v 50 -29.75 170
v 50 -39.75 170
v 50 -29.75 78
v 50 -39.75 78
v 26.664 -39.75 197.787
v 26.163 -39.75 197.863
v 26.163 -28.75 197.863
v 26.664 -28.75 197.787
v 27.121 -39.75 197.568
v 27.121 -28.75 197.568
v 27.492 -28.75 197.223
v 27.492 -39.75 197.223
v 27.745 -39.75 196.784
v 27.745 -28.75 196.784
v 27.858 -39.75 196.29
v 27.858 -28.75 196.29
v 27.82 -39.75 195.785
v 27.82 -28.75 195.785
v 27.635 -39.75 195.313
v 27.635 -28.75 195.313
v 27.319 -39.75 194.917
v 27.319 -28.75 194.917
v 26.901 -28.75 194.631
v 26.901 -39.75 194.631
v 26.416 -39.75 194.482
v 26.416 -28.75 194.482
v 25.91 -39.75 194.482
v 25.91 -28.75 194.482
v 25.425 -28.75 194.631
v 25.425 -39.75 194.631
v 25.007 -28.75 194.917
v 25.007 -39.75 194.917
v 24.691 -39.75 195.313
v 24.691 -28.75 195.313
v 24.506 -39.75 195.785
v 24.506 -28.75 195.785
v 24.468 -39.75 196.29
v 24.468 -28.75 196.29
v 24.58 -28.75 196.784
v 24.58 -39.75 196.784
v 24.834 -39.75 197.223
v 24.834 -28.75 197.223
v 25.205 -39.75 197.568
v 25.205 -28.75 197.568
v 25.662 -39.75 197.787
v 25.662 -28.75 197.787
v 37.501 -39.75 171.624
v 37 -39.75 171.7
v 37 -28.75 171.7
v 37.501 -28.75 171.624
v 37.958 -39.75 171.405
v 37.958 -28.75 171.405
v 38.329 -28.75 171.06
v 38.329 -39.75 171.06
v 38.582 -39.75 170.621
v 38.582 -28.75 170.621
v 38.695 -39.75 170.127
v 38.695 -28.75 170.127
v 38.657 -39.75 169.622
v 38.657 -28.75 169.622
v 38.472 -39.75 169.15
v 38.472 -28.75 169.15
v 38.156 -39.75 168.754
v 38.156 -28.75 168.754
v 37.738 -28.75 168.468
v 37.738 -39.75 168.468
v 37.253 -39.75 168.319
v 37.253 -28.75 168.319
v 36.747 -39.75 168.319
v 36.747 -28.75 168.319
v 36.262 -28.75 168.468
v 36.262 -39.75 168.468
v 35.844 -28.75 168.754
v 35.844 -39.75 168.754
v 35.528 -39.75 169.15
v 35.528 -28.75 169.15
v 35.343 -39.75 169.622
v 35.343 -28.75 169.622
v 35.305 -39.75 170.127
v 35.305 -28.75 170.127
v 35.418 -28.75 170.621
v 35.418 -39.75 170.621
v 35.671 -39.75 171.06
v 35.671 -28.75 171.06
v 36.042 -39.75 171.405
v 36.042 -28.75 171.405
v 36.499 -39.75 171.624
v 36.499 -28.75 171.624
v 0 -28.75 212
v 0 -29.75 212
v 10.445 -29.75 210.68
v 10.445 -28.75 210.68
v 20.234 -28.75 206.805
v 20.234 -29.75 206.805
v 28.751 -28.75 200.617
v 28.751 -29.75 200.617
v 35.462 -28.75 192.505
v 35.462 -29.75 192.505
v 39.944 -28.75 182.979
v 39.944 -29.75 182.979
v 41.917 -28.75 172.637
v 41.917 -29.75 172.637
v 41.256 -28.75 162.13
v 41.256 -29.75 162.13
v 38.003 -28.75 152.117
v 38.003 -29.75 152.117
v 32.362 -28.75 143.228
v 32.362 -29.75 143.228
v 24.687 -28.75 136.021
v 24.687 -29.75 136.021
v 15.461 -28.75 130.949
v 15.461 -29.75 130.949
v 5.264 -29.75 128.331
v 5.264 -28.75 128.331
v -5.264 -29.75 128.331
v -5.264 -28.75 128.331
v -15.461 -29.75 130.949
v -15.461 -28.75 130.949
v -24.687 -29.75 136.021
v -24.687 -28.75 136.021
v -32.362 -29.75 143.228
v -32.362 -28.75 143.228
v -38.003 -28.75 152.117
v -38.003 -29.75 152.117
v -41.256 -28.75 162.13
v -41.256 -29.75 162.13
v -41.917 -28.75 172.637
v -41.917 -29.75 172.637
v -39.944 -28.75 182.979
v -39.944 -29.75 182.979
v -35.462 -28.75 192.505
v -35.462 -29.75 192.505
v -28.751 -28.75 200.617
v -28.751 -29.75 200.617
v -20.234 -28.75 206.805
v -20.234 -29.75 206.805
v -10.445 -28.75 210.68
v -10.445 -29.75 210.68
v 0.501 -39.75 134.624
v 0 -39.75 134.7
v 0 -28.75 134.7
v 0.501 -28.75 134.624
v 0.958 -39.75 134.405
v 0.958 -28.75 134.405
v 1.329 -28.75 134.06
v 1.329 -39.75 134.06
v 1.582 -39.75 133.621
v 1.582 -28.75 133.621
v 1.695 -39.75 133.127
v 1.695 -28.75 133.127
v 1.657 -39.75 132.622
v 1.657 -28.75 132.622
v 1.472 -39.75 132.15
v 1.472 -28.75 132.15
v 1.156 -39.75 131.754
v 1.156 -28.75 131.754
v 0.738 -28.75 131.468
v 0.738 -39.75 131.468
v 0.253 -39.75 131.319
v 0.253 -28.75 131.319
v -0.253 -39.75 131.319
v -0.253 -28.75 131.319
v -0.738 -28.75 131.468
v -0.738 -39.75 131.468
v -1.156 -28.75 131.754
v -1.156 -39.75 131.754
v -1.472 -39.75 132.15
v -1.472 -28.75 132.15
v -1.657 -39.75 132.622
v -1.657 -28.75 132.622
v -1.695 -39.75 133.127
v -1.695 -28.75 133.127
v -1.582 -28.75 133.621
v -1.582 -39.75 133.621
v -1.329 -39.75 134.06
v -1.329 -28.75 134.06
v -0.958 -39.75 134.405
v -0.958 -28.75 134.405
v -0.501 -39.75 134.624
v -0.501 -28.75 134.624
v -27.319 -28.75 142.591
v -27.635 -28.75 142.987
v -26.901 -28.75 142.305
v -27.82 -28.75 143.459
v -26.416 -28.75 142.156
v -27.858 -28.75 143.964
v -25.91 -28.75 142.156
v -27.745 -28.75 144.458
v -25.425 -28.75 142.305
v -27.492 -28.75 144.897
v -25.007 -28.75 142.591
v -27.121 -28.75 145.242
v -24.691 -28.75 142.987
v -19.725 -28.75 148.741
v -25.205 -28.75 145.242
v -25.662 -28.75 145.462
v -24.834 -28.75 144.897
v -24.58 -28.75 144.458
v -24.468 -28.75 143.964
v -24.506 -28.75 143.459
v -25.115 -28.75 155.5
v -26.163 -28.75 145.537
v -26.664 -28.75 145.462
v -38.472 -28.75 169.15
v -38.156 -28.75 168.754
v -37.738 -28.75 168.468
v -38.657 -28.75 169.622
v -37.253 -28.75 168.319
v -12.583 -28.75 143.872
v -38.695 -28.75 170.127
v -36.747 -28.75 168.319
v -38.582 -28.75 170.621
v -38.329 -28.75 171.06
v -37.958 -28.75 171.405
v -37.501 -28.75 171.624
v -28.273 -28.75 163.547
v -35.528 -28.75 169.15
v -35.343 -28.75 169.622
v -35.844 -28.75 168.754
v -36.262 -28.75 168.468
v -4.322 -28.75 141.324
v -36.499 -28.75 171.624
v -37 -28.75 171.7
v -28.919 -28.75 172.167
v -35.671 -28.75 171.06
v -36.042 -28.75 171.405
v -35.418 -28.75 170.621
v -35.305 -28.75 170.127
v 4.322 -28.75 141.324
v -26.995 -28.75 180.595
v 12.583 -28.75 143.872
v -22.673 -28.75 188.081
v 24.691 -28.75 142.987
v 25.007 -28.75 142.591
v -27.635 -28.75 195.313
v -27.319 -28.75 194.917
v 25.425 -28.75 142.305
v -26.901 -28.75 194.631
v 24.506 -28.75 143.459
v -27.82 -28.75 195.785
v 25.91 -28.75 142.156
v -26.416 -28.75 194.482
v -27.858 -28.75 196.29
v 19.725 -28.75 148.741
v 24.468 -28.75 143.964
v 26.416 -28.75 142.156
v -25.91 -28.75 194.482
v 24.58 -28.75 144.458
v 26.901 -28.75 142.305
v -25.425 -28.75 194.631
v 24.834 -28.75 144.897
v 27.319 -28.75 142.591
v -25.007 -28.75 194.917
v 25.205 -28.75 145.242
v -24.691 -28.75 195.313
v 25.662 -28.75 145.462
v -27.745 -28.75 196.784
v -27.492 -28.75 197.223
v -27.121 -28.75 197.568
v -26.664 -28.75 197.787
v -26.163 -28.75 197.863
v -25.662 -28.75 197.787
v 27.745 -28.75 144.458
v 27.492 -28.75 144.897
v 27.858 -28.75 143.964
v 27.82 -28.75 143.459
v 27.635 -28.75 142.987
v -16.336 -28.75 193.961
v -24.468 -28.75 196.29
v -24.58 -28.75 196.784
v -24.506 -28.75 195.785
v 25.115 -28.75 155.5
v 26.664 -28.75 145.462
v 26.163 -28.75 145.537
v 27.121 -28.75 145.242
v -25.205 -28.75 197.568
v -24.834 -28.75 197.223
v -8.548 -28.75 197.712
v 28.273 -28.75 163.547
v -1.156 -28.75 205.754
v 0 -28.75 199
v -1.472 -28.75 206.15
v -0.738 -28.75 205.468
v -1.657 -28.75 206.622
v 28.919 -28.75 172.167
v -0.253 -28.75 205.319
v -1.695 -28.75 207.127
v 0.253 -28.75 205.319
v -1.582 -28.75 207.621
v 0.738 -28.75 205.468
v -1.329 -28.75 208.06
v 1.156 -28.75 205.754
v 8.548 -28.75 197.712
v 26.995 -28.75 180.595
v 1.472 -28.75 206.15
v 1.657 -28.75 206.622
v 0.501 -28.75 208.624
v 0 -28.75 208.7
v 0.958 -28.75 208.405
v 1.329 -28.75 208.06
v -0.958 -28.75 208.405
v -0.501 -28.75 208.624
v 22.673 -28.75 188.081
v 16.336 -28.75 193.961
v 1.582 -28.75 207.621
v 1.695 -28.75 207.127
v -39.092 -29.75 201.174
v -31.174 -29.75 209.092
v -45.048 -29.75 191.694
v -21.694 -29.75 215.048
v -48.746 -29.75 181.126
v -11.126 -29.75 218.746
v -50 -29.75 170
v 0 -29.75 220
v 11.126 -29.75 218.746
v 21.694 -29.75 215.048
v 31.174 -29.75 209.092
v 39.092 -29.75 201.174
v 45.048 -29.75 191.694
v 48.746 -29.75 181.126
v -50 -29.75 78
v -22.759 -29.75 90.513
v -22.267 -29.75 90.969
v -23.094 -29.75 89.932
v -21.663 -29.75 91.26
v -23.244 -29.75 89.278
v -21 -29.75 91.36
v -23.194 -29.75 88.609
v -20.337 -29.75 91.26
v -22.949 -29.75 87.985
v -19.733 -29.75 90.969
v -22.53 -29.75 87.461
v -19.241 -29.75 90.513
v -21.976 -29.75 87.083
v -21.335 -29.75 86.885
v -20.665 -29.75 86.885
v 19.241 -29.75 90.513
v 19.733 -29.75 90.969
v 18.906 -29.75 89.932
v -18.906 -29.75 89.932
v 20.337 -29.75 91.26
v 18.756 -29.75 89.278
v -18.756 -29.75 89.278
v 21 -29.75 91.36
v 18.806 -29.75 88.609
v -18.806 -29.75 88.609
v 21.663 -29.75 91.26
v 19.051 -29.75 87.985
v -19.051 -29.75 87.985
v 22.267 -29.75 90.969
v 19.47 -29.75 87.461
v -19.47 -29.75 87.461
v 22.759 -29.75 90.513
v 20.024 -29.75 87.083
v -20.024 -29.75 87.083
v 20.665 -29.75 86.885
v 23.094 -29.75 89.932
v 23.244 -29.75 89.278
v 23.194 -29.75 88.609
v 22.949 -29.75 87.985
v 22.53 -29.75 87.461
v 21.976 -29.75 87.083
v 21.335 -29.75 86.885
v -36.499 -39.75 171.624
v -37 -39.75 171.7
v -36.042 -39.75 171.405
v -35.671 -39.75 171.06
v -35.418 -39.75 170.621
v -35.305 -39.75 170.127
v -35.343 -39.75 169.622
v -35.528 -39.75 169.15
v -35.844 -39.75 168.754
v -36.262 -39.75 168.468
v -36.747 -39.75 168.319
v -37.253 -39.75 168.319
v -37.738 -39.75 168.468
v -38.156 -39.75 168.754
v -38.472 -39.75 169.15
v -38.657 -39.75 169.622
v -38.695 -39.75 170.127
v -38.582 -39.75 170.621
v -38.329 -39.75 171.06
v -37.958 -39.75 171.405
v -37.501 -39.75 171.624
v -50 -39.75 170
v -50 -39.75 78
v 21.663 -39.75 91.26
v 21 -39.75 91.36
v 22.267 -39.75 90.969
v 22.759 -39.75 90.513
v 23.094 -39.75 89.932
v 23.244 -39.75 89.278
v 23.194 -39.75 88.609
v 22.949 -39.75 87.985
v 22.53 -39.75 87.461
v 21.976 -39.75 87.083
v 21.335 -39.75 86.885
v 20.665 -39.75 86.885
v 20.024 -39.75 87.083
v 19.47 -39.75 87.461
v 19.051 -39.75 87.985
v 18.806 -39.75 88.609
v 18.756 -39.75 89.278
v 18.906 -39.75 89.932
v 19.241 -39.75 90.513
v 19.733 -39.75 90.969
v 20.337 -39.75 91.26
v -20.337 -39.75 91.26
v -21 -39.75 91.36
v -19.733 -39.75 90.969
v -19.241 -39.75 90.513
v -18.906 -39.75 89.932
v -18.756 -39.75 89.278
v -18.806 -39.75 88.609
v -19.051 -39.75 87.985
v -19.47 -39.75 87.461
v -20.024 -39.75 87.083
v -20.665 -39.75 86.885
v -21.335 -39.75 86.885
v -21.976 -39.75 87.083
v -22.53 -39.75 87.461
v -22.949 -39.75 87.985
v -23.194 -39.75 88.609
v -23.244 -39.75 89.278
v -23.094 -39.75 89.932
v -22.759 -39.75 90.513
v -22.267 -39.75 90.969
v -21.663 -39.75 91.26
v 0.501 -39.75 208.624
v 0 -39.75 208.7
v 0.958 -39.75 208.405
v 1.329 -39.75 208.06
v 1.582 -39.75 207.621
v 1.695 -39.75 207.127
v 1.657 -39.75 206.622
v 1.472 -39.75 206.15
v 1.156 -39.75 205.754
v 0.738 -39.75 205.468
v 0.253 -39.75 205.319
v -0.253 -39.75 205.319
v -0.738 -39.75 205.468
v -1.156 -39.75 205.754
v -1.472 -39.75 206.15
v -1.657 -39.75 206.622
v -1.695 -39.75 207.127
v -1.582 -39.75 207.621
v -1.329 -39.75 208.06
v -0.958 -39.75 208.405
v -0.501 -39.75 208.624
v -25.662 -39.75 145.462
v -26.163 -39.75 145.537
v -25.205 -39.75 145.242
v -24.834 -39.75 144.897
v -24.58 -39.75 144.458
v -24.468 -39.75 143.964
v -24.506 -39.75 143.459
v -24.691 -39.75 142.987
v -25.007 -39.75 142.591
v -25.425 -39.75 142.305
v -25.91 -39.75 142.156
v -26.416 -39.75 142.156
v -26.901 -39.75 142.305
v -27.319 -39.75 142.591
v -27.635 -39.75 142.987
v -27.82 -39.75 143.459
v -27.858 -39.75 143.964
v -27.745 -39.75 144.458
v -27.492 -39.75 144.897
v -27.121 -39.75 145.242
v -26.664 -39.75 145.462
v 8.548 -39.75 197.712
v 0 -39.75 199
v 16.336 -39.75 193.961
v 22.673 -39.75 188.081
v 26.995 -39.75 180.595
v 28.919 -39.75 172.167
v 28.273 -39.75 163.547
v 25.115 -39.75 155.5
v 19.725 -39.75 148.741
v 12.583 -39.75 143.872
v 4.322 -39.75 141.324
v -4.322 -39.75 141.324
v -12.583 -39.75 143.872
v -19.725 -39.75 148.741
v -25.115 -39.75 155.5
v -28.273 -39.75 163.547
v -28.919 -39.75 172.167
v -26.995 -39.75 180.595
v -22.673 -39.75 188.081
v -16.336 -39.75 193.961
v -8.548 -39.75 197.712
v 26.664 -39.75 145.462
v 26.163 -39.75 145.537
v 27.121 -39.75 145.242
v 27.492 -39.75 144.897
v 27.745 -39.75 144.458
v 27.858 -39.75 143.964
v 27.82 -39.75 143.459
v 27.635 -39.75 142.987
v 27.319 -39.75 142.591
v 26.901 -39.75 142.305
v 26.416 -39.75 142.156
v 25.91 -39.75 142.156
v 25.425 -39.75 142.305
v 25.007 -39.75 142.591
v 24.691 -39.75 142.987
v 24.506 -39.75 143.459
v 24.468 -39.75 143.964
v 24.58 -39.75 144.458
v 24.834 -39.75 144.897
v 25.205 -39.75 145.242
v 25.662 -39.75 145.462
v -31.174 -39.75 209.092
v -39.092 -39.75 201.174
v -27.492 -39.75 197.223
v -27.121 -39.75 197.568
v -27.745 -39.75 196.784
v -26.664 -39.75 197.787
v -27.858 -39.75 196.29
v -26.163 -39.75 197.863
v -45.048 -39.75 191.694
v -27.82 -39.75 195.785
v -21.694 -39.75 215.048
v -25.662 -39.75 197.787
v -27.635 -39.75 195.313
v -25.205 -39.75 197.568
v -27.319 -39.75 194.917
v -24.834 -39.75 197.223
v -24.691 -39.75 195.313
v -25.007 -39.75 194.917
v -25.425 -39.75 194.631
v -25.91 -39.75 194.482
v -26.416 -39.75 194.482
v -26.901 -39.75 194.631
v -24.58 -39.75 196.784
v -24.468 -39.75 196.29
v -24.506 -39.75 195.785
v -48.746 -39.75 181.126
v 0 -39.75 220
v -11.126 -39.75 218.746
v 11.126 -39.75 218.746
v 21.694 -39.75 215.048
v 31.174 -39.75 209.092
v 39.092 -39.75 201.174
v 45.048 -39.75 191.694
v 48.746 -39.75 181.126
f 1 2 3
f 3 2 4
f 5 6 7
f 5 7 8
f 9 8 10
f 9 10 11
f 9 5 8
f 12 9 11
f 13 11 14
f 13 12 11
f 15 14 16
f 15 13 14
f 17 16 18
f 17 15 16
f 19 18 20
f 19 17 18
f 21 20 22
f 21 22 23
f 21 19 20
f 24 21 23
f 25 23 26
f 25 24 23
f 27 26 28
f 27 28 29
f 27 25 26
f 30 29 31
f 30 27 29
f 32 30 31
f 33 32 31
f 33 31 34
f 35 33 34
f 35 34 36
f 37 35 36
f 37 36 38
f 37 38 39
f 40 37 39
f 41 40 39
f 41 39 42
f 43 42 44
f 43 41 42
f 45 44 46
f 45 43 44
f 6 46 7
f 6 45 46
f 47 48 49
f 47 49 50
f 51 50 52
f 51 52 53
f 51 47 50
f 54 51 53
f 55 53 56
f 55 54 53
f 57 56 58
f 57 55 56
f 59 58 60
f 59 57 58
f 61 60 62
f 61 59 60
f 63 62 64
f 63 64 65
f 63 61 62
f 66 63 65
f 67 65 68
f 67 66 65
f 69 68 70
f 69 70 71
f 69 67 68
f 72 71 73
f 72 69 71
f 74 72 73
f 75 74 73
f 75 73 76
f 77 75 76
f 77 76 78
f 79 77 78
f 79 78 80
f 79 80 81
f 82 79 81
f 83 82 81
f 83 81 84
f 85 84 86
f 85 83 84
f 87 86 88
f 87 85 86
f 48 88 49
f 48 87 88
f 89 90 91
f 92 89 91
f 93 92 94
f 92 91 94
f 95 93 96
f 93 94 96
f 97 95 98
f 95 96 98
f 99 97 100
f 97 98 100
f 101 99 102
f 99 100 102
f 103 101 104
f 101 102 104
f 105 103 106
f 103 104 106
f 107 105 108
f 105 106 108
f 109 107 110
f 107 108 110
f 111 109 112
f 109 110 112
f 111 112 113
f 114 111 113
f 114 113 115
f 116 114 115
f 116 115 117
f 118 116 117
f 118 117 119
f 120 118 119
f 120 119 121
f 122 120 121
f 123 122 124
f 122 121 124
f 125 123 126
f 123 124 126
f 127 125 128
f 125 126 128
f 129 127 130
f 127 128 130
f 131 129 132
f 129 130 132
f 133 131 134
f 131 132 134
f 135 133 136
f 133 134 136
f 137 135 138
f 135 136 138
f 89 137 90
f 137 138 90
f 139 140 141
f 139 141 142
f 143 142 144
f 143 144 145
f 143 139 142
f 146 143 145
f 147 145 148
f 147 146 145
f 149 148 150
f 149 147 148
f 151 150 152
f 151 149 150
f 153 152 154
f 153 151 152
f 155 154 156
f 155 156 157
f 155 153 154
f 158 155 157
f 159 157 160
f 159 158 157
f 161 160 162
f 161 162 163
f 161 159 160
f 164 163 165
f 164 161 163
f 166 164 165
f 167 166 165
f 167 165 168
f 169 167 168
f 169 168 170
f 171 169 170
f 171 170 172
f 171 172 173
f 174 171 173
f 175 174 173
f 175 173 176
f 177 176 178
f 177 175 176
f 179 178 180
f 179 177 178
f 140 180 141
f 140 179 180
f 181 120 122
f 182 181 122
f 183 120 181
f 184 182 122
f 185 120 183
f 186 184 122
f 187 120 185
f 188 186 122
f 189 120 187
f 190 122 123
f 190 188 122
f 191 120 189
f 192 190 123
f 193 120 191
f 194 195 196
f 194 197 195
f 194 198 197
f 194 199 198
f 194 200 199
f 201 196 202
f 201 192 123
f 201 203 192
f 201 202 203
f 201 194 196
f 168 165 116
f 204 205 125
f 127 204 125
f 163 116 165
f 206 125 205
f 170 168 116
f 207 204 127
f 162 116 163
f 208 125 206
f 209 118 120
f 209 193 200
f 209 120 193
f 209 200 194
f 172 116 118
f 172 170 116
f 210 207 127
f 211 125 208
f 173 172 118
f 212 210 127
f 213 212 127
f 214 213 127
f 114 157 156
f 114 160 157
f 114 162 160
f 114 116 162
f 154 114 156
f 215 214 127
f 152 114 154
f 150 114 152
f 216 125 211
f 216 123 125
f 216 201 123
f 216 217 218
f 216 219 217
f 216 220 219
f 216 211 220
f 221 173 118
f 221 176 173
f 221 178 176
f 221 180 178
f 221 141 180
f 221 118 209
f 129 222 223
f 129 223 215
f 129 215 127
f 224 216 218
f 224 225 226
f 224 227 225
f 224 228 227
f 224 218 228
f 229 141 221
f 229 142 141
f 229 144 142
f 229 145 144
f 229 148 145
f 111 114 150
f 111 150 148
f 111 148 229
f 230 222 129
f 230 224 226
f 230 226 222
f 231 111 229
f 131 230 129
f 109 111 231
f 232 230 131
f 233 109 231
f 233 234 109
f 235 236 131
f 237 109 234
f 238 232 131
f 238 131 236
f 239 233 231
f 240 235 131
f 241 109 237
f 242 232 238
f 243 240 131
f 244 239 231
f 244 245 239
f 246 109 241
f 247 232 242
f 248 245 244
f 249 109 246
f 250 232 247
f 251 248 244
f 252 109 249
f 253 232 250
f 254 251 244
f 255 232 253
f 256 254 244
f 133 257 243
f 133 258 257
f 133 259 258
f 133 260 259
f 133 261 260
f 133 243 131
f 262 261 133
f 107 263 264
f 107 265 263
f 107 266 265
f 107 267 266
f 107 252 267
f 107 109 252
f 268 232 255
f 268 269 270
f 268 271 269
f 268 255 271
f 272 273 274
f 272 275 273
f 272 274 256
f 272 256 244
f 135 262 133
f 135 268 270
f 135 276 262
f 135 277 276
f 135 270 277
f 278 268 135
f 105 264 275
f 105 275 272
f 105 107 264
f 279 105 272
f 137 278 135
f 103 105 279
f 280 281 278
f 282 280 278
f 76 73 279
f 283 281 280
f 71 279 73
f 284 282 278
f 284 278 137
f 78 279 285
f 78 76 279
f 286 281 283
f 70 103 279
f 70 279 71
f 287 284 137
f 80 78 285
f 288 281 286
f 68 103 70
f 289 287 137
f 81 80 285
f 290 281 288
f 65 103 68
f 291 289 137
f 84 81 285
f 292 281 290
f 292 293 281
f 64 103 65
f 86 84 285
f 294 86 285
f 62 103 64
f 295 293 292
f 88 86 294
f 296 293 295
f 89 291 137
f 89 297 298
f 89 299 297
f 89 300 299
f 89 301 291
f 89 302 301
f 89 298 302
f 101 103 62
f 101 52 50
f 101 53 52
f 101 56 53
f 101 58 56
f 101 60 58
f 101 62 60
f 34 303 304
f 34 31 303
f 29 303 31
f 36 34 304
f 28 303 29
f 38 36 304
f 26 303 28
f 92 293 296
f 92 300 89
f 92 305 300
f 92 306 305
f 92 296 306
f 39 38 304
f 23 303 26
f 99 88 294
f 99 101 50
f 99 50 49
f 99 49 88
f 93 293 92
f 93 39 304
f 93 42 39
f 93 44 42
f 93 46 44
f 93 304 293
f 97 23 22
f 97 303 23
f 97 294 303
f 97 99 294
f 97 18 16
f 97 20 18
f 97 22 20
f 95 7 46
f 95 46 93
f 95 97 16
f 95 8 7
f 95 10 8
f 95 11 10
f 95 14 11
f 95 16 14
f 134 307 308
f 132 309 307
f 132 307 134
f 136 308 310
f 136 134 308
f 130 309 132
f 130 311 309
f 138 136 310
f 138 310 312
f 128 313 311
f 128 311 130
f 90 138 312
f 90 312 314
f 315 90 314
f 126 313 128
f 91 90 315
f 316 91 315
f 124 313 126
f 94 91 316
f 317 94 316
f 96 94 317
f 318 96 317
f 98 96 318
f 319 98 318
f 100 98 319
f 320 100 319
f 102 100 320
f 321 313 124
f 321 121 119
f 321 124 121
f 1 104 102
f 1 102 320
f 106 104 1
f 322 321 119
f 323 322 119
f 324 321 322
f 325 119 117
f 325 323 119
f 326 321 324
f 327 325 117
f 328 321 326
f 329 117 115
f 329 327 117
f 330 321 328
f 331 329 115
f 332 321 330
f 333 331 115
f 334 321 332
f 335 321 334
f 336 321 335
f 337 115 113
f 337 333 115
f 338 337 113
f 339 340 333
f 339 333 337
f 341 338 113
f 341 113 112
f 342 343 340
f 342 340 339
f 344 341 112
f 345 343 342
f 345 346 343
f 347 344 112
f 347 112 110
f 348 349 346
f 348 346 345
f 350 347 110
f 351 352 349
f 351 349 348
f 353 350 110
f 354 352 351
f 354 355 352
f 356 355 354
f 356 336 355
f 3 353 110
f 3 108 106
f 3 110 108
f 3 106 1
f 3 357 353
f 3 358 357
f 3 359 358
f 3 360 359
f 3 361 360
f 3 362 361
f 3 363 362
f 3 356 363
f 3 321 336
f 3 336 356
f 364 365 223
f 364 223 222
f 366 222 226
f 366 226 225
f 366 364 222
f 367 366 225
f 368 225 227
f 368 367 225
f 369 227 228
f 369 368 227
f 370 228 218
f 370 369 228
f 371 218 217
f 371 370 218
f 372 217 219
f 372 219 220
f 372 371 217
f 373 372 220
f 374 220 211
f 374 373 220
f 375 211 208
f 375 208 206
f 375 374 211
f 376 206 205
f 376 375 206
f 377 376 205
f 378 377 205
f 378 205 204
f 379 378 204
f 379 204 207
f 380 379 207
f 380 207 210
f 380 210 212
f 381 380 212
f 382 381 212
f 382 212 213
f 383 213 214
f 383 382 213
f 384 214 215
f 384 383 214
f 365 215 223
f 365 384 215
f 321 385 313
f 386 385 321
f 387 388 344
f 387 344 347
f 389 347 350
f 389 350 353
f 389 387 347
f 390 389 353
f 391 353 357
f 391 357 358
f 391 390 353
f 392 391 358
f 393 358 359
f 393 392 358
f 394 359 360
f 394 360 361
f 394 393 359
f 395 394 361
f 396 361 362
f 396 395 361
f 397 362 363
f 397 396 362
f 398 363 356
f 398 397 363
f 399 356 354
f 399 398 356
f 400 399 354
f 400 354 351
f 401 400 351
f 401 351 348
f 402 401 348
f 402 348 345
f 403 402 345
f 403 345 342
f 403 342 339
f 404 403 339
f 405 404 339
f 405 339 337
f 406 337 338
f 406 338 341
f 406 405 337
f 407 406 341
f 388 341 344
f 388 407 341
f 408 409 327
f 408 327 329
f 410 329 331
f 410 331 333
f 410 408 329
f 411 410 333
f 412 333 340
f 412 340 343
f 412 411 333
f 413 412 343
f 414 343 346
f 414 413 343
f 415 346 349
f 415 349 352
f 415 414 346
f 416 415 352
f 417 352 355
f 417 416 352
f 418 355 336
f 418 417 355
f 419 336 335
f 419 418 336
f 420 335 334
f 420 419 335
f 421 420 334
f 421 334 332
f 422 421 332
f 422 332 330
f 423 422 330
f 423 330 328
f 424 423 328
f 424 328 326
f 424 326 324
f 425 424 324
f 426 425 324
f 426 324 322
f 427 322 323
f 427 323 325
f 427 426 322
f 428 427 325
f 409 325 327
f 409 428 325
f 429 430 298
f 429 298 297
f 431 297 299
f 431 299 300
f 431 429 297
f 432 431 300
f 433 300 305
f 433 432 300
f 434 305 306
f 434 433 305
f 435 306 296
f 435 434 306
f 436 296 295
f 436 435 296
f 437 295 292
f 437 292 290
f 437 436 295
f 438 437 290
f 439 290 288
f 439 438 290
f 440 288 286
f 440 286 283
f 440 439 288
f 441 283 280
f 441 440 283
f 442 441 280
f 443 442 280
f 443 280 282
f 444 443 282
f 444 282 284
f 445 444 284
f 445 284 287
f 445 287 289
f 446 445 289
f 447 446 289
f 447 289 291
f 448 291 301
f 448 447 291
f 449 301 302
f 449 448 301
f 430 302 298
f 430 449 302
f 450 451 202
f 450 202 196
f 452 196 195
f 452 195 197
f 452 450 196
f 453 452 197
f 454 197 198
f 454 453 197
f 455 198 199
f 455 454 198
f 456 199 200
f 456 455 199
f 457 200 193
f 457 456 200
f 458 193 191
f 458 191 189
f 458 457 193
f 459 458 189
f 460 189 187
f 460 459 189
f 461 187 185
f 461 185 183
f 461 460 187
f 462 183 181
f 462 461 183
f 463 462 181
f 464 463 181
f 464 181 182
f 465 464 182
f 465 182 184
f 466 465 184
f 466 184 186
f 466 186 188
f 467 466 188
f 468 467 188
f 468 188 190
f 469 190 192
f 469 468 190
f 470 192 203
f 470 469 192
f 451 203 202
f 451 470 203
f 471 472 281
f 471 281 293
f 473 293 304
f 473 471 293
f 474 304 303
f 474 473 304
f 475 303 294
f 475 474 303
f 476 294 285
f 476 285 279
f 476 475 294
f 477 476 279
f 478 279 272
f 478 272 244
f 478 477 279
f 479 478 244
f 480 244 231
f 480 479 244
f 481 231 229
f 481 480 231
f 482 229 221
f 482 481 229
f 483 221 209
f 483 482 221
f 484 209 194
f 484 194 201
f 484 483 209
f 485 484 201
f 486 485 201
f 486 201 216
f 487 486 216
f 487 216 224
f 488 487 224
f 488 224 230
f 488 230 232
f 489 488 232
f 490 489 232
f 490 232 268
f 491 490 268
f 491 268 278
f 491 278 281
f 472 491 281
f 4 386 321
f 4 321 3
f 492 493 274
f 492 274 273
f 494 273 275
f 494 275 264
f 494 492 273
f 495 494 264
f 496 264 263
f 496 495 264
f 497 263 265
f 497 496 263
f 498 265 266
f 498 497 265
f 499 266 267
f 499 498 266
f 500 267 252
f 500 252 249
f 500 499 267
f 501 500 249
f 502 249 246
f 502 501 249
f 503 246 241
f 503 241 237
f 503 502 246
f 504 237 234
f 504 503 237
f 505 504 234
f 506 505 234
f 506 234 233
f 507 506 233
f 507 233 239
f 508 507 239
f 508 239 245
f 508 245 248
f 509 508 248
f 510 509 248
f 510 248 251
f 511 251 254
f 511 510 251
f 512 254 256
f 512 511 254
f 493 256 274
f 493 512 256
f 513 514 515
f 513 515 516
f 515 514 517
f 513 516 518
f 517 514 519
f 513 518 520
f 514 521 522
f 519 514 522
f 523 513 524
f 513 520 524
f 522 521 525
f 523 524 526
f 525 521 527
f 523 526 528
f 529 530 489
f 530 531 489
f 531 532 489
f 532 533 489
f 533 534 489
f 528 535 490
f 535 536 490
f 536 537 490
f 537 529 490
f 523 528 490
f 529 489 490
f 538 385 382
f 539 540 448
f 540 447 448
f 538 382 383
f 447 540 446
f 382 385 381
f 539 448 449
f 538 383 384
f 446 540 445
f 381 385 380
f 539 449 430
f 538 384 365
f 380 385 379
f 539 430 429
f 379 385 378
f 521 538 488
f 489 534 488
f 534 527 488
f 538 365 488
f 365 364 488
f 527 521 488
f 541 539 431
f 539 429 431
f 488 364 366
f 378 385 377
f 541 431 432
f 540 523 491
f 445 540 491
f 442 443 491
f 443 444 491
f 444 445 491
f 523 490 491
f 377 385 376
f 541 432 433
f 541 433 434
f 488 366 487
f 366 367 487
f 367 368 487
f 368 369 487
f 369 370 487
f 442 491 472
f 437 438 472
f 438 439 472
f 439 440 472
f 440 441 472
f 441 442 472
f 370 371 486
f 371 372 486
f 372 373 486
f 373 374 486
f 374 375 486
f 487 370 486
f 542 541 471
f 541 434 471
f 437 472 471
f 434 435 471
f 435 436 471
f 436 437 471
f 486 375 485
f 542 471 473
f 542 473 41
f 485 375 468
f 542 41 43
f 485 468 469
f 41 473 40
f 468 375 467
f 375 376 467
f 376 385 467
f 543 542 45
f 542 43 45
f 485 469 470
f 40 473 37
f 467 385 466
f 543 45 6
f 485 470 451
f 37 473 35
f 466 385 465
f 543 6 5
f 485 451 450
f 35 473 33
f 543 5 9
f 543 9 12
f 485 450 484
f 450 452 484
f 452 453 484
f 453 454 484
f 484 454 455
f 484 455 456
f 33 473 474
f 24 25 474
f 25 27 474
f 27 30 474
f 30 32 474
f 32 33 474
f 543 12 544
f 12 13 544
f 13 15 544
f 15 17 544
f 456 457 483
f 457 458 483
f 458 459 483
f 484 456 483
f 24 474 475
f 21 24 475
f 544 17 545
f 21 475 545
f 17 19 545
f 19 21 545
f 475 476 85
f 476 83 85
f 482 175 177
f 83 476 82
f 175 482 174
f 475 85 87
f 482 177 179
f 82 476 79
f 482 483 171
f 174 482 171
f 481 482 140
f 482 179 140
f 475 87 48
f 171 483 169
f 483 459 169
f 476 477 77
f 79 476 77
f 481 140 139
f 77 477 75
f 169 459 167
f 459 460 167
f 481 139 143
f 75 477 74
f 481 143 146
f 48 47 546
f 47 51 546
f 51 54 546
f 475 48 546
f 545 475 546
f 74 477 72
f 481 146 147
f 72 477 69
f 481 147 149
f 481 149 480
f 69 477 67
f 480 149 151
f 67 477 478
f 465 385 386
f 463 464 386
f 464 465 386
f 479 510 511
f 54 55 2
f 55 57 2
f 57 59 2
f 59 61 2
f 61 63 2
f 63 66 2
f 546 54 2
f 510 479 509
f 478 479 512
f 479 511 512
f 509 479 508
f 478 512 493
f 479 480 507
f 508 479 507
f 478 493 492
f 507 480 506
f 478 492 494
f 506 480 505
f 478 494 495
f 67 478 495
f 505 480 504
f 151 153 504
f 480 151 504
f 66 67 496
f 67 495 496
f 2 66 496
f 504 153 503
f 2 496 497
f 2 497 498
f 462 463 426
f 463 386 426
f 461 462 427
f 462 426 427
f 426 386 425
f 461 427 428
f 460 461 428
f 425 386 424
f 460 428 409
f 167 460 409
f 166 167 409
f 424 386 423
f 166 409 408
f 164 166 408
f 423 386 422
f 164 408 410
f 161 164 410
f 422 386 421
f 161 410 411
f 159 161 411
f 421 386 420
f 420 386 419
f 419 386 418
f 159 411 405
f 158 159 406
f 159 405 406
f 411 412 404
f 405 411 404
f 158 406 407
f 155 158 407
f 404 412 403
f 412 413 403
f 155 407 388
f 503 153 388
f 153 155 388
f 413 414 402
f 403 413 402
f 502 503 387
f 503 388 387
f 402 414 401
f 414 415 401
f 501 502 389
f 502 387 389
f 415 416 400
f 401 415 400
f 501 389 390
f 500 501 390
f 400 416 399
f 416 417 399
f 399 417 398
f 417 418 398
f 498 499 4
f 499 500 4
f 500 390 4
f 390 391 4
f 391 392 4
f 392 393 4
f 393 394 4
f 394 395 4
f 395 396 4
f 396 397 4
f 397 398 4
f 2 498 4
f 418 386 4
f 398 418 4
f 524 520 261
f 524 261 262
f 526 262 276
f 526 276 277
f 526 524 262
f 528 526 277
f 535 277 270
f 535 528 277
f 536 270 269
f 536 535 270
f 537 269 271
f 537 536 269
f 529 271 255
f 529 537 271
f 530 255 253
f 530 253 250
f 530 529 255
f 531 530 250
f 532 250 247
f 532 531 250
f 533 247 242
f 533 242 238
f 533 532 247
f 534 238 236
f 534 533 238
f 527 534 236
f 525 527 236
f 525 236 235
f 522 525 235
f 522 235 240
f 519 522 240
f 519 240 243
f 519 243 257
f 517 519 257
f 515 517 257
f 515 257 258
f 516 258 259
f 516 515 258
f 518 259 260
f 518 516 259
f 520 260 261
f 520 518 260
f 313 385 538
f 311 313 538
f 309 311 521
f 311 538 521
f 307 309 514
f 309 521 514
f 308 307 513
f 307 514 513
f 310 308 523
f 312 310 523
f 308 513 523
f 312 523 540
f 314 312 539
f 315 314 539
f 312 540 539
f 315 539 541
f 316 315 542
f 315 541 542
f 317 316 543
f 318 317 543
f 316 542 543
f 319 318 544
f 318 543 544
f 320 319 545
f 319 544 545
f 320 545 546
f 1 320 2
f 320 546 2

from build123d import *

# Parameters (mm, degrees)
PARED_START                  = -39.75
SK_PARED_W                   = 100
SK_PARED_H                   = 92
PARED_DEPTH                  = 10
CABEZA_START                 = -39.75
SK_CABEZA_R                  = 50
CABEZA_DEPTH                 = 10
ASIENTO_1MM_START            = -29.75
SK_ASIENTO_1MM_R             = 42
SK_ASIENTO_1MM_R_2           = 29
ASIENTO_1MM_DEPTH            = 1
PASO_BOSS_J2_START           = -39.75
SK_PASO_BOSS_J2_R            = 29
PASO_BOSS_J2_DEPTH           = 11
PASANTES_M3_ESTATOR_J2_START = -39.75
SK_PASANTES_M3_ESTATOR_J2_R  = 1.7
PASANTES_M3_ESTATOR_J2_DEPTH = 11
PASANTES_M4_ANGULOS_START    = -39.75
SK_PASANTES_M4_ANGULOS_R     = 2.25
PASANTES_M4_ANGULOS_DEPTH    = 10


with BuildPart() as part:
    # Sk_Pared → Pared (new body)
    with BuildSketch(Plane(origin=(0, 0, 0), x_dir=(1, 0, 0), z_dir=(0, 1, 0)).offset(PARED_START)):
        with Locations((0, -124)):
            Rectangle(SK_PARED_W, SK_PARED_H)
    extrude(amount=PARED_DEPTH)

    # Sk_Cabeza → Cabeza (add)
    with BuildSketch(Plane(origin=(0, 0, 0), x_dir=(1, 0, 0), z_dir=(0, 1, 0)).offset(CABEZA_START)):
        with Locations((0, -170)):
            Circle(SK_CABEZA_R)
    extrude(amount=CABEZA_DEPTH)

    # Sk_Asiento_1mm → Asiento_1mm (add)
    with BuildSketch(Plane(origin=(0, 0, 0), x_dir=(1, 0, 0), z_dir=(0, 1, 0)).offset(ASIENTO_1MM_START)):
        with Locations(Location((0, -170, 0), (0, 0, 270))):
            Circle(SK_ASIENTO_1MM_R)
        with Locations(Location((0, -170, 0), (0, 0, 270))):
            Circle(SK_ASIENTO_1MM_R_2, mode=Mode.SUBTRACT)
    extrude(amount=ASIENTO_1MM_DEPTH)

    # Sk_Paso_boss_J2 → Paso_boss_J2 (cut)
    with BuildSketch(Plane(origin=(0, 0, 0), x_dir=(1, 0, 0), z_dir=(0, 1, 0)).offset(PASO_BOSS_J2_START)):
        with Locations(Location((0, -170, 0), (0, 0, 270))):
            Circle(SK_PASO_BOSS_J2_R)
    extrude(amount=PASO_BOSS_J2_DEPTH, mode=Mode.SUBTRACT)

    # Sk_Pasantes_M3_estator_J2 → Pasantes_M3_estator_J2 (cut)
    with BuildSketch(Plane(origin=(0, 0, 0), x_dir=(1, 0, 0), z_dir=(0, 1, 0)).offset(PASANTES_M3_ESTATOR_J2_START)):
        with Locations(Location((37, -170, 0), (0, 0, 270))):
            Circle(SK_PASANTES_M3_ESTATOR_J2_R)
        with Locations(Location((26.162950904, -196.162950904, 0), (0, 0, 270))):
            Circle(SK_PASANTES_M3_ESTATOR_J2_R)
        with Locations(Location((0, -207, 0), (0, 0, 270))):
            Circle(SK_PASANTES_M3_ESTATOR_J2_R)
        with Locations(Location((-26.162950904, -196.162950904, 0), (0, 0, 270))):
            Circle(SK_PASANTES_M3_ESTATOR_J2_R)
        with Locations(Location((-37, -170, 0), (0, 0, 270))):
            Circle(SK_PASANTES_M3_ESTATOR_J2_R)
        with Locations(Location((-26.162950904, -143.837049096, 0), (0, 0, 270))):
            Circle(SK_PASANTES_M3_ESTATOR_J2_R)
        with Locations(Location((0, -133, 0), (0, 0, 270))):
            Circle(SK_PASANTES_M3_ESTATOR_J2_R)
        with Locations(Location((26.162950904, -143.837049096, 0), (0, 0, 270))):
            Circle(SK_PASANTES_M3_ESTATOR_J2_R)
    extrude(amount=PASANTES_M3_ESTATOR_J2_DEPTH, mode=Mode.SUBTRACT)

    # Sk_Pasantes_M4_angulos → Pasantes_M4_angulos (cut)
    with BuildSketch(Plane(origin=(0, 0, 0), x_dir=(1, 0, 0), z_dir=(0, 1, 0)).offset(PASANTES_M4_ANGULOS_START)):
        with Locations(Location((-21, -89.11, 0), (0, 0, 270))):
            Circle(SK_PASANTES_M4_ANGULOS_R)
        with Locations(Location((21, -89.11, 0), (0, 0, 270))):
            Circle(SK_PASANTES_M4_ANGULOS_R)
    extrude(amount=PASANTES_M4_ANGULOS_DEPTH, mode=Mode.SUBTRACT)


solid = part.part
